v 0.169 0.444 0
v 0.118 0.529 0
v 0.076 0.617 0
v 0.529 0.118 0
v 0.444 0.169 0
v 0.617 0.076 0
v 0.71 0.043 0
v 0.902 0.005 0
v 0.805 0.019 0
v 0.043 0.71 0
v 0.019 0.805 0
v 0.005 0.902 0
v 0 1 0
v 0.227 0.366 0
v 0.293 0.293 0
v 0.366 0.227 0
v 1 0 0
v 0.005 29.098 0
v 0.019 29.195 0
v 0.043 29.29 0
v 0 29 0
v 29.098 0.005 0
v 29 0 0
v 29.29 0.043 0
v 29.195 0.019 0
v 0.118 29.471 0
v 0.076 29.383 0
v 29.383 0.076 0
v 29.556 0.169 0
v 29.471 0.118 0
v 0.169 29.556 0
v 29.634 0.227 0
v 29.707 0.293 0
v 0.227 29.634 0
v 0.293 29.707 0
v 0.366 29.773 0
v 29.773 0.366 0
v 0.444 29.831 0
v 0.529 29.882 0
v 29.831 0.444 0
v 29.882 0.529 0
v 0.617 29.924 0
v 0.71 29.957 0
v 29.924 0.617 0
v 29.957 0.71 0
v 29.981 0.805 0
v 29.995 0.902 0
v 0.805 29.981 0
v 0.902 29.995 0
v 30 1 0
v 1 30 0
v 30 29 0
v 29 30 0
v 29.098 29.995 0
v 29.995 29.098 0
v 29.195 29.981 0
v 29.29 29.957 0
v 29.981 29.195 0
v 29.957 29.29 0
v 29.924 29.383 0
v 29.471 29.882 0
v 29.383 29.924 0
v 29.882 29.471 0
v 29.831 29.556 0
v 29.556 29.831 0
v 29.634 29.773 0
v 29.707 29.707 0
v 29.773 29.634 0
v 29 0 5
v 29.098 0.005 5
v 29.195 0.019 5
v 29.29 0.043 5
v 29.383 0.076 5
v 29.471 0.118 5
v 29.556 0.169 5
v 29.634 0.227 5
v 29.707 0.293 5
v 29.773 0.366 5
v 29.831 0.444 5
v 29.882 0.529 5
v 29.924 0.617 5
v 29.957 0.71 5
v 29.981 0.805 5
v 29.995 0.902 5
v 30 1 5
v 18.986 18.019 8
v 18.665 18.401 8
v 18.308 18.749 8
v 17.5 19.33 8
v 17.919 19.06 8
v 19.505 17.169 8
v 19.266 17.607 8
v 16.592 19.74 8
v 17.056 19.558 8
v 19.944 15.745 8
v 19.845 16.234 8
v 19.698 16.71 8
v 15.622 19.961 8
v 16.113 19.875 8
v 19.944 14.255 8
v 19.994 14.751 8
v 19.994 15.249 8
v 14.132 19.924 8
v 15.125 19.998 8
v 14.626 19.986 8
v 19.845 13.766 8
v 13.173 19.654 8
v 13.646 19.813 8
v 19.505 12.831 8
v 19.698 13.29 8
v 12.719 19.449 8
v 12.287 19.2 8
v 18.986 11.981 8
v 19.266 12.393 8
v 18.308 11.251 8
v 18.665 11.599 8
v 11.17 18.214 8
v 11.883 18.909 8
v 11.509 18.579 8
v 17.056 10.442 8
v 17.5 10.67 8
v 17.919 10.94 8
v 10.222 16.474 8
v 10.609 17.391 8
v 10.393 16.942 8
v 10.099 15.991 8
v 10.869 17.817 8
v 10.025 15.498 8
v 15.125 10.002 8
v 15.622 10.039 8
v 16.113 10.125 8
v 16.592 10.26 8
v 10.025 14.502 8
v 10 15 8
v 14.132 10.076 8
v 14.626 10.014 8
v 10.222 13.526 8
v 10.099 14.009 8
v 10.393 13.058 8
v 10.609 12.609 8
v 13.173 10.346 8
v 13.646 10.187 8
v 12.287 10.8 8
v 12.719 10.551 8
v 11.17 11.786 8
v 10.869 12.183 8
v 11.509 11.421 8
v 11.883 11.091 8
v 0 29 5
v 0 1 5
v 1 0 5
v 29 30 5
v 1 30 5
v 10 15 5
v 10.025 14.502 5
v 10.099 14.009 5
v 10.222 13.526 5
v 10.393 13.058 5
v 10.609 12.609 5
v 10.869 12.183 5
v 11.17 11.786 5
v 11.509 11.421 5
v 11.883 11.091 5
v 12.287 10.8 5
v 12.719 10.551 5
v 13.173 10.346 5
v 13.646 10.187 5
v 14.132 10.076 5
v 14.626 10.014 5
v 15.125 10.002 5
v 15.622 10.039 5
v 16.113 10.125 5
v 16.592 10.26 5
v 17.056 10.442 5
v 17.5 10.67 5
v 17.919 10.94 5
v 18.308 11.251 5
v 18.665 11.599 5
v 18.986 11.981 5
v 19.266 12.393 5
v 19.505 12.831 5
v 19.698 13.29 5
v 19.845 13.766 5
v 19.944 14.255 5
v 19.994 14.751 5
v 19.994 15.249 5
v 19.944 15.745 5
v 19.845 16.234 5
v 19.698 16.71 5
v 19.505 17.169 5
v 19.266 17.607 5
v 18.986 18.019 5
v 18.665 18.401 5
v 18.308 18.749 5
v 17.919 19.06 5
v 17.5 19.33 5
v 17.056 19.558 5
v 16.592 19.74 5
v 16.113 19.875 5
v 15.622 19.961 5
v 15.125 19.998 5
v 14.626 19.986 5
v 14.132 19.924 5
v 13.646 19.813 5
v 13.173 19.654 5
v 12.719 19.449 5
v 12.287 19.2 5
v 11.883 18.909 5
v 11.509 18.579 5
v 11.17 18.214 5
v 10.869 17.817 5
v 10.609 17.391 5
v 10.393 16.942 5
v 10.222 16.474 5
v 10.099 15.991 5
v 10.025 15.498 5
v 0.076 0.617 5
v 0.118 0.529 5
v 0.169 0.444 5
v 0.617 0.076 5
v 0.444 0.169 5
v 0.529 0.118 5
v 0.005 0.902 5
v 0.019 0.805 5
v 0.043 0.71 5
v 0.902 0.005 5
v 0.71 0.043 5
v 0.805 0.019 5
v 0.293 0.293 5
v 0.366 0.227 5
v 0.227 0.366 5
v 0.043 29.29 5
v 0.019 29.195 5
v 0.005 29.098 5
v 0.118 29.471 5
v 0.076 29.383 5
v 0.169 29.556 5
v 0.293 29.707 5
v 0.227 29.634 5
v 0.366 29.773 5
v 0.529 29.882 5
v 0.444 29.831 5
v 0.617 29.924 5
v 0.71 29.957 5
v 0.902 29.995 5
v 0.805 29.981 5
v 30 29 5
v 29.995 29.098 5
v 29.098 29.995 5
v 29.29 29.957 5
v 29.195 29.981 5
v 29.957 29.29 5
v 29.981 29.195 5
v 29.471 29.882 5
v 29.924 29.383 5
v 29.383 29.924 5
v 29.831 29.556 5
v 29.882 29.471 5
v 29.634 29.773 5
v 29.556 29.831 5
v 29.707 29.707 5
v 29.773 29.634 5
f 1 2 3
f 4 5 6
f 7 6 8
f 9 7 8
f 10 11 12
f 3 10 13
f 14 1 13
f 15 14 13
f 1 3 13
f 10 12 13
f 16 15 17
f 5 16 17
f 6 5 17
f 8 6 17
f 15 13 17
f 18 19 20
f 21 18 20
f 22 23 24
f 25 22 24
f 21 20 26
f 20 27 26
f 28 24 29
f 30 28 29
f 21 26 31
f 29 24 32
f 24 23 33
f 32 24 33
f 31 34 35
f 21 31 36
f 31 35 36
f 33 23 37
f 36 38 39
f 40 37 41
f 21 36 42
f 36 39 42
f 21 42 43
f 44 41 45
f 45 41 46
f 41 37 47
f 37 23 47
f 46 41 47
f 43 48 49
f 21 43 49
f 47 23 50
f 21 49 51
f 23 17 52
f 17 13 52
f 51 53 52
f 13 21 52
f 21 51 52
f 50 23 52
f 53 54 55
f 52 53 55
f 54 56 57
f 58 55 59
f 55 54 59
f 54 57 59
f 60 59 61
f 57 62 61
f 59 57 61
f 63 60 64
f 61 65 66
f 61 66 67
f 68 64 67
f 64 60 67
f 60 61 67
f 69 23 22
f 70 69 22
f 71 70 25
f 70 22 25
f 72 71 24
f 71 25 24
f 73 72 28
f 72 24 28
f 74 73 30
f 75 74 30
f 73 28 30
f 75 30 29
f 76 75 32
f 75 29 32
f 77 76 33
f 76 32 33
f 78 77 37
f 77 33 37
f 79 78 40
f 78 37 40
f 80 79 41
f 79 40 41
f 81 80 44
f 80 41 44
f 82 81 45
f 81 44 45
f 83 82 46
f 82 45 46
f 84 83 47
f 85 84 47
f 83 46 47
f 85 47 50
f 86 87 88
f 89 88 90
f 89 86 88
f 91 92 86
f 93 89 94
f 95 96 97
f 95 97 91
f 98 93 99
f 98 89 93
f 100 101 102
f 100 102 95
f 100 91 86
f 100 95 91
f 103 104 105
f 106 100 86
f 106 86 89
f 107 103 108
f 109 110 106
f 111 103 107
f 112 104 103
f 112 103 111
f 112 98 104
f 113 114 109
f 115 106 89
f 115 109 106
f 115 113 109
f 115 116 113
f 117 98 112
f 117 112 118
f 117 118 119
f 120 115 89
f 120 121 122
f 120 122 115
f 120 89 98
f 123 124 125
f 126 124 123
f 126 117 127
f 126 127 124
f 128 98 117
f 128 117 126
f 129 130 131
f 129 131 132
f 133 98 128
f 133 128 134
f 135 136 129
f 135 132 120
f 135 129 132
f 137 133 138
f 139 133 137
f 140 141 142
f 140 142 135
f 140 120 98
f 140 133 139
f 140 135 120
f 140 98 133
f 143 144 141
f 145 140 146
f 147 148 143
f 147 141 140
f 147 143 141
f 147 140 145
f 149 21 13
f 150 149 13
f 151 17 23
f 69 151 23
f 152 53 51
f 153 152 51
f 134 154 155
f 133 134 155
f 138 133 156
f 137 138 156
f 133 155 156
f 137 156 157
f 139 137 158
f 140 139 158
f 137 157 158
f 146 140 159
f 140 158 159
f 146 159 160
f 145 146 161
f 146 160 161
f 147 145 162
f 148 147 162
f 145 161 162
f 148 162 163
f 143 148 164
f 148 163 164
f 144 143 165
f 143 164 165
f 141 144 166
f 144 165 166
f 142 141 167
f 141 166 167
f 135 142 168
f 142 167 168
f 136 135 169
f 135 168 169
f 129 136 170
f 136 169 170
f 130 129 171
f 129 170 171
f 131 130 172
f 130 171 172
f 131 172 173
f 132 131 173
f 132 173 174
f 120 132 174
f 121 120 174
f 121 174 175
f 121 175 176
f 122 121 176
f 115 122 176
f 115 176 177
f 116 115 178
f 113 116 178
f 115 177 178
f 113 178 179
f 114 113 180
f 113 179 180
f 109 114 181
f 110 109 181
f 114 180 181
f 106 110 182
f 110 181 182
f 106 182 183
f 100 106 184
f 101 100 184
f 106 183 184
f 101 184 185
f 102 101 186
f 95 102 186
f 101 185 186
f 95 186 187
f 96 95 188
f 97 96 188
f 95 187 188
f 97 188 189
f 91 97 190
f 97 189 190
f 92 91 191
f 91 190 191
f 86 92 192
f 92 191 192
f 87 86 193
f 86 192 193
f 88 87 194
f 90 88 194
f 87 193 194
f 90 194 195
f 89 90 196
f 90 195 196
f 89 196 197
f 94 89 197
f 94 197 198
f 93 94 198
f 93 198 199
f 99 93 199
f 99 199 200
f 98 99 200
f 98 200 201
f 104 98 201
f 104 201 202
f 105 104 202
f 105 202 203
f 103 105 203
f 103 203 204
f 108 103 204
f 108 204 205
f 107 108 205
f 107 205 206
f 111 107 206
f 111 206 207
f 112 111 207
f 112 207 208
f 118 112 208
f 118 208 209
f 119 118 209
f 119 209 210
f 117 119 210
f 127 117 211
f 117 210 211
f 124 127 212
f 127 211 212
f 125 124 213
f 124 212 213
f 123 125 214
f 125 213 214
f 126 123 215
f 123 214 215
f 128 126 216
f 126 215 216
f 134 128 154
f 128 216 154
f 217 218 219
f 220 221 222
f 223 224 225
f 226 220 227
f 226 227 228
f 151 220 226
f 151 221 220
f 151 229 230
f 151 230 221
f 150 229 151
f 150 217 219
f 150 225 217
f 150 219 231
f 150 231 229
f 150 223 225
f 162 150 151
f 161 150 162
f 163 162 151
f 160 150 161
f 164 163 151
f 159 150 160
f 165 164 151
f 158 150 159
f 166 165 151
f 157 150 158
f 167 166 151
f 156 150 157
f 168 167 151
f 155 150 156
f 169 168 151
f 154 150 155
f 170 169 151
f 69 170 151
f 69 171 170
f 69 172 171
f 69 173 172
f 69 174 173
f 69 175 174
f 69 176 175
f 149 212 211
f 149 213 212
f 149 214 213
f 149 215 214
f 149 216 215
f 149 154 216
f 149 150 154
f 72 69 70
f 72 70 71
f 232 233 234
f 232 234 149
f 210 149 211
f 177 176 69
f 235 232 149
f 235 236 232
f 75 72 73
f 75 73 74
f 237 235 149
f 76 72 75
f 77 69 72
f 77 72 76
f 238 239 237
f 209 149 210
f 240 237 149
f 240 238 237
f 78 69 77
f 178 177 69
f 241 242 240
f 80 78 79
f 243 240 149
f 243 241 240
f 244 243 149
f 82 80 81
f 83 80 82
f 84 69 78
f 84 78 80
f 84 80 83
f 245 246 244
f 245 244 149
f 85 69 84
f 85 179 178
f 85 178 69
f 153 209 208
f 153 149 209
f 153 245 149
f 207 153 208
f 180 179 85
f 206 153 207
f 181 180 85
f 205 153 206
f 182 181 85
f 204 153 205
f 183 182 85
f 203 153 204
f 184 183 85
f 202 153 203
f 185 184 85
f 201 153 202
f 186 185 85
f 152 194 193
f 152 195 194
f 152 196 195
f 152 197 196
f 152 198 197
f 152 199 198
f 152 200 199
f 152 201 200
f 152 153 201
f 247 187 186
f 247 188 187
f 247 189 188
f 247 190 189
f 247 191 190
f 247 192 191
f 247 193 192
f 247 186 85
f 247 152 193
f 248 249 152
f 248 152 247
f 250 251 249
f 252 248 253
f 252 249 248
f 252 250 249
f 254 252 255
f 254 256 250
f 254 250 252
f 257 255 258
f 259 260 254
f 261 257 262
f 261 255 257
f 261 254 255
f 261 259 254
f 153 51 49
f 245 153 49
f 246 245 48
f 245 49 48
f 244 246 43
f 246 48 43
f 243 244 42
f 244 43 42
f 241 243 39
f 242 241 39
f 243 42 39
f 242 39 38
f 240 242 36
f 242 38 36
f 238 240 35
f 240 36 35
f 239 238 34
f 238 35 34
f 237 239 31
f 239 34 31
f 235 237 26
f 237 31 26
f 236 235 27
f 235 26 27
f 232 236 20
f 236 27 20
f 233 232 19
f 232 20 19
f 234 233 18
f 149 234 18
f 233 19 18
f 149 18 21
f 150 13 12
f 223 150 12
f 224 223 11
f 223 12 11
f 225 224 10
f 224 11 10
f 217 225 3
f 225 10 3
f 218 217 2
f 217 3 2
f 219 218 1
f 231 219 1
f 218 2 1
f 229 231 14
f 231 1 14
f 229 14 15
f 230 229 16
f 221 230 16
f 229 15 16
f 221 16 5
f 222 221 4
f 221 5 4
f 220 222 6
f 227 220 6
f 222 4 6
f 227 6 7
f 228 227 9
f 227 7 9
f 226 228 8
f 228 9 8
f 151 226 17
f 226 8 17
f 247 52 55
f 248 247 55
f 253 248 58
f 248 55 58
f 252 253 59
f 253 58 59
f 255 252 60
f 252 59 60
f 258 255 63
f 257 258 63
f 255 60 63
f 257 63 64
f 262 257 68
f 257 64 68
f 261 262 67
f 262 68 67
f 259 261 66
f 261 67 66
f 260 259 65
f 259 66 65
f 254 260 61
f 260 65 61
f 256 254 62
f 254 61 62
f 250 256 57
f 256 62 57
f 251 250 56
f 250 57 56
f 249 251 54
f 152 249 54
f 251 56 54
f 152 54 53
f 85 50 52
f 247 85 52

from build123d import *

# Parameters (mm, degrees)
BOSS_EXTRUDE1_DEPTH = 5
SKETCH2_R           = 5
BOSS_EXTRUDE2_DEPTH = 3


with BuildPart() as part:
    # Sketch1 → Boss-Extrude1 (new body)
    with BuildSketch(Plane.XY):
        with BuildLine():
            Line((1, 0), (29, 0))
            ThreePointArc((29, 0), (29.707106781, 0.292893219), (30, 1))
            Line((30, 1), (30, 29))
            ThreePointArc((30, 29), (29.707106781, 29.707106781), (29, 30))
            Line((29, 30), (1, 30))
            ThreePointArc((1, 30), (0.292893219, 29.707106781), (0, 29))
            Line((0, 29), (0, 1))
            ThreePointArc((0, 1), (0.292893219, 0.292893219), (1, 0))
        make_face()
    extrude(amount=BOSS_EXTRUDE1_DEPTH)

    # Sketch2 → Boss-Extrude2 (add)
    with BuildSketch(Plane.XY.offset(5)):
        with Locations(Location((15, 15, 0), (0, 0, 180))):
            Circle(SKETCH2_R)
    extrude(amount=BOSS_EXTRUDE2_DEPTH)


solid = part.part
